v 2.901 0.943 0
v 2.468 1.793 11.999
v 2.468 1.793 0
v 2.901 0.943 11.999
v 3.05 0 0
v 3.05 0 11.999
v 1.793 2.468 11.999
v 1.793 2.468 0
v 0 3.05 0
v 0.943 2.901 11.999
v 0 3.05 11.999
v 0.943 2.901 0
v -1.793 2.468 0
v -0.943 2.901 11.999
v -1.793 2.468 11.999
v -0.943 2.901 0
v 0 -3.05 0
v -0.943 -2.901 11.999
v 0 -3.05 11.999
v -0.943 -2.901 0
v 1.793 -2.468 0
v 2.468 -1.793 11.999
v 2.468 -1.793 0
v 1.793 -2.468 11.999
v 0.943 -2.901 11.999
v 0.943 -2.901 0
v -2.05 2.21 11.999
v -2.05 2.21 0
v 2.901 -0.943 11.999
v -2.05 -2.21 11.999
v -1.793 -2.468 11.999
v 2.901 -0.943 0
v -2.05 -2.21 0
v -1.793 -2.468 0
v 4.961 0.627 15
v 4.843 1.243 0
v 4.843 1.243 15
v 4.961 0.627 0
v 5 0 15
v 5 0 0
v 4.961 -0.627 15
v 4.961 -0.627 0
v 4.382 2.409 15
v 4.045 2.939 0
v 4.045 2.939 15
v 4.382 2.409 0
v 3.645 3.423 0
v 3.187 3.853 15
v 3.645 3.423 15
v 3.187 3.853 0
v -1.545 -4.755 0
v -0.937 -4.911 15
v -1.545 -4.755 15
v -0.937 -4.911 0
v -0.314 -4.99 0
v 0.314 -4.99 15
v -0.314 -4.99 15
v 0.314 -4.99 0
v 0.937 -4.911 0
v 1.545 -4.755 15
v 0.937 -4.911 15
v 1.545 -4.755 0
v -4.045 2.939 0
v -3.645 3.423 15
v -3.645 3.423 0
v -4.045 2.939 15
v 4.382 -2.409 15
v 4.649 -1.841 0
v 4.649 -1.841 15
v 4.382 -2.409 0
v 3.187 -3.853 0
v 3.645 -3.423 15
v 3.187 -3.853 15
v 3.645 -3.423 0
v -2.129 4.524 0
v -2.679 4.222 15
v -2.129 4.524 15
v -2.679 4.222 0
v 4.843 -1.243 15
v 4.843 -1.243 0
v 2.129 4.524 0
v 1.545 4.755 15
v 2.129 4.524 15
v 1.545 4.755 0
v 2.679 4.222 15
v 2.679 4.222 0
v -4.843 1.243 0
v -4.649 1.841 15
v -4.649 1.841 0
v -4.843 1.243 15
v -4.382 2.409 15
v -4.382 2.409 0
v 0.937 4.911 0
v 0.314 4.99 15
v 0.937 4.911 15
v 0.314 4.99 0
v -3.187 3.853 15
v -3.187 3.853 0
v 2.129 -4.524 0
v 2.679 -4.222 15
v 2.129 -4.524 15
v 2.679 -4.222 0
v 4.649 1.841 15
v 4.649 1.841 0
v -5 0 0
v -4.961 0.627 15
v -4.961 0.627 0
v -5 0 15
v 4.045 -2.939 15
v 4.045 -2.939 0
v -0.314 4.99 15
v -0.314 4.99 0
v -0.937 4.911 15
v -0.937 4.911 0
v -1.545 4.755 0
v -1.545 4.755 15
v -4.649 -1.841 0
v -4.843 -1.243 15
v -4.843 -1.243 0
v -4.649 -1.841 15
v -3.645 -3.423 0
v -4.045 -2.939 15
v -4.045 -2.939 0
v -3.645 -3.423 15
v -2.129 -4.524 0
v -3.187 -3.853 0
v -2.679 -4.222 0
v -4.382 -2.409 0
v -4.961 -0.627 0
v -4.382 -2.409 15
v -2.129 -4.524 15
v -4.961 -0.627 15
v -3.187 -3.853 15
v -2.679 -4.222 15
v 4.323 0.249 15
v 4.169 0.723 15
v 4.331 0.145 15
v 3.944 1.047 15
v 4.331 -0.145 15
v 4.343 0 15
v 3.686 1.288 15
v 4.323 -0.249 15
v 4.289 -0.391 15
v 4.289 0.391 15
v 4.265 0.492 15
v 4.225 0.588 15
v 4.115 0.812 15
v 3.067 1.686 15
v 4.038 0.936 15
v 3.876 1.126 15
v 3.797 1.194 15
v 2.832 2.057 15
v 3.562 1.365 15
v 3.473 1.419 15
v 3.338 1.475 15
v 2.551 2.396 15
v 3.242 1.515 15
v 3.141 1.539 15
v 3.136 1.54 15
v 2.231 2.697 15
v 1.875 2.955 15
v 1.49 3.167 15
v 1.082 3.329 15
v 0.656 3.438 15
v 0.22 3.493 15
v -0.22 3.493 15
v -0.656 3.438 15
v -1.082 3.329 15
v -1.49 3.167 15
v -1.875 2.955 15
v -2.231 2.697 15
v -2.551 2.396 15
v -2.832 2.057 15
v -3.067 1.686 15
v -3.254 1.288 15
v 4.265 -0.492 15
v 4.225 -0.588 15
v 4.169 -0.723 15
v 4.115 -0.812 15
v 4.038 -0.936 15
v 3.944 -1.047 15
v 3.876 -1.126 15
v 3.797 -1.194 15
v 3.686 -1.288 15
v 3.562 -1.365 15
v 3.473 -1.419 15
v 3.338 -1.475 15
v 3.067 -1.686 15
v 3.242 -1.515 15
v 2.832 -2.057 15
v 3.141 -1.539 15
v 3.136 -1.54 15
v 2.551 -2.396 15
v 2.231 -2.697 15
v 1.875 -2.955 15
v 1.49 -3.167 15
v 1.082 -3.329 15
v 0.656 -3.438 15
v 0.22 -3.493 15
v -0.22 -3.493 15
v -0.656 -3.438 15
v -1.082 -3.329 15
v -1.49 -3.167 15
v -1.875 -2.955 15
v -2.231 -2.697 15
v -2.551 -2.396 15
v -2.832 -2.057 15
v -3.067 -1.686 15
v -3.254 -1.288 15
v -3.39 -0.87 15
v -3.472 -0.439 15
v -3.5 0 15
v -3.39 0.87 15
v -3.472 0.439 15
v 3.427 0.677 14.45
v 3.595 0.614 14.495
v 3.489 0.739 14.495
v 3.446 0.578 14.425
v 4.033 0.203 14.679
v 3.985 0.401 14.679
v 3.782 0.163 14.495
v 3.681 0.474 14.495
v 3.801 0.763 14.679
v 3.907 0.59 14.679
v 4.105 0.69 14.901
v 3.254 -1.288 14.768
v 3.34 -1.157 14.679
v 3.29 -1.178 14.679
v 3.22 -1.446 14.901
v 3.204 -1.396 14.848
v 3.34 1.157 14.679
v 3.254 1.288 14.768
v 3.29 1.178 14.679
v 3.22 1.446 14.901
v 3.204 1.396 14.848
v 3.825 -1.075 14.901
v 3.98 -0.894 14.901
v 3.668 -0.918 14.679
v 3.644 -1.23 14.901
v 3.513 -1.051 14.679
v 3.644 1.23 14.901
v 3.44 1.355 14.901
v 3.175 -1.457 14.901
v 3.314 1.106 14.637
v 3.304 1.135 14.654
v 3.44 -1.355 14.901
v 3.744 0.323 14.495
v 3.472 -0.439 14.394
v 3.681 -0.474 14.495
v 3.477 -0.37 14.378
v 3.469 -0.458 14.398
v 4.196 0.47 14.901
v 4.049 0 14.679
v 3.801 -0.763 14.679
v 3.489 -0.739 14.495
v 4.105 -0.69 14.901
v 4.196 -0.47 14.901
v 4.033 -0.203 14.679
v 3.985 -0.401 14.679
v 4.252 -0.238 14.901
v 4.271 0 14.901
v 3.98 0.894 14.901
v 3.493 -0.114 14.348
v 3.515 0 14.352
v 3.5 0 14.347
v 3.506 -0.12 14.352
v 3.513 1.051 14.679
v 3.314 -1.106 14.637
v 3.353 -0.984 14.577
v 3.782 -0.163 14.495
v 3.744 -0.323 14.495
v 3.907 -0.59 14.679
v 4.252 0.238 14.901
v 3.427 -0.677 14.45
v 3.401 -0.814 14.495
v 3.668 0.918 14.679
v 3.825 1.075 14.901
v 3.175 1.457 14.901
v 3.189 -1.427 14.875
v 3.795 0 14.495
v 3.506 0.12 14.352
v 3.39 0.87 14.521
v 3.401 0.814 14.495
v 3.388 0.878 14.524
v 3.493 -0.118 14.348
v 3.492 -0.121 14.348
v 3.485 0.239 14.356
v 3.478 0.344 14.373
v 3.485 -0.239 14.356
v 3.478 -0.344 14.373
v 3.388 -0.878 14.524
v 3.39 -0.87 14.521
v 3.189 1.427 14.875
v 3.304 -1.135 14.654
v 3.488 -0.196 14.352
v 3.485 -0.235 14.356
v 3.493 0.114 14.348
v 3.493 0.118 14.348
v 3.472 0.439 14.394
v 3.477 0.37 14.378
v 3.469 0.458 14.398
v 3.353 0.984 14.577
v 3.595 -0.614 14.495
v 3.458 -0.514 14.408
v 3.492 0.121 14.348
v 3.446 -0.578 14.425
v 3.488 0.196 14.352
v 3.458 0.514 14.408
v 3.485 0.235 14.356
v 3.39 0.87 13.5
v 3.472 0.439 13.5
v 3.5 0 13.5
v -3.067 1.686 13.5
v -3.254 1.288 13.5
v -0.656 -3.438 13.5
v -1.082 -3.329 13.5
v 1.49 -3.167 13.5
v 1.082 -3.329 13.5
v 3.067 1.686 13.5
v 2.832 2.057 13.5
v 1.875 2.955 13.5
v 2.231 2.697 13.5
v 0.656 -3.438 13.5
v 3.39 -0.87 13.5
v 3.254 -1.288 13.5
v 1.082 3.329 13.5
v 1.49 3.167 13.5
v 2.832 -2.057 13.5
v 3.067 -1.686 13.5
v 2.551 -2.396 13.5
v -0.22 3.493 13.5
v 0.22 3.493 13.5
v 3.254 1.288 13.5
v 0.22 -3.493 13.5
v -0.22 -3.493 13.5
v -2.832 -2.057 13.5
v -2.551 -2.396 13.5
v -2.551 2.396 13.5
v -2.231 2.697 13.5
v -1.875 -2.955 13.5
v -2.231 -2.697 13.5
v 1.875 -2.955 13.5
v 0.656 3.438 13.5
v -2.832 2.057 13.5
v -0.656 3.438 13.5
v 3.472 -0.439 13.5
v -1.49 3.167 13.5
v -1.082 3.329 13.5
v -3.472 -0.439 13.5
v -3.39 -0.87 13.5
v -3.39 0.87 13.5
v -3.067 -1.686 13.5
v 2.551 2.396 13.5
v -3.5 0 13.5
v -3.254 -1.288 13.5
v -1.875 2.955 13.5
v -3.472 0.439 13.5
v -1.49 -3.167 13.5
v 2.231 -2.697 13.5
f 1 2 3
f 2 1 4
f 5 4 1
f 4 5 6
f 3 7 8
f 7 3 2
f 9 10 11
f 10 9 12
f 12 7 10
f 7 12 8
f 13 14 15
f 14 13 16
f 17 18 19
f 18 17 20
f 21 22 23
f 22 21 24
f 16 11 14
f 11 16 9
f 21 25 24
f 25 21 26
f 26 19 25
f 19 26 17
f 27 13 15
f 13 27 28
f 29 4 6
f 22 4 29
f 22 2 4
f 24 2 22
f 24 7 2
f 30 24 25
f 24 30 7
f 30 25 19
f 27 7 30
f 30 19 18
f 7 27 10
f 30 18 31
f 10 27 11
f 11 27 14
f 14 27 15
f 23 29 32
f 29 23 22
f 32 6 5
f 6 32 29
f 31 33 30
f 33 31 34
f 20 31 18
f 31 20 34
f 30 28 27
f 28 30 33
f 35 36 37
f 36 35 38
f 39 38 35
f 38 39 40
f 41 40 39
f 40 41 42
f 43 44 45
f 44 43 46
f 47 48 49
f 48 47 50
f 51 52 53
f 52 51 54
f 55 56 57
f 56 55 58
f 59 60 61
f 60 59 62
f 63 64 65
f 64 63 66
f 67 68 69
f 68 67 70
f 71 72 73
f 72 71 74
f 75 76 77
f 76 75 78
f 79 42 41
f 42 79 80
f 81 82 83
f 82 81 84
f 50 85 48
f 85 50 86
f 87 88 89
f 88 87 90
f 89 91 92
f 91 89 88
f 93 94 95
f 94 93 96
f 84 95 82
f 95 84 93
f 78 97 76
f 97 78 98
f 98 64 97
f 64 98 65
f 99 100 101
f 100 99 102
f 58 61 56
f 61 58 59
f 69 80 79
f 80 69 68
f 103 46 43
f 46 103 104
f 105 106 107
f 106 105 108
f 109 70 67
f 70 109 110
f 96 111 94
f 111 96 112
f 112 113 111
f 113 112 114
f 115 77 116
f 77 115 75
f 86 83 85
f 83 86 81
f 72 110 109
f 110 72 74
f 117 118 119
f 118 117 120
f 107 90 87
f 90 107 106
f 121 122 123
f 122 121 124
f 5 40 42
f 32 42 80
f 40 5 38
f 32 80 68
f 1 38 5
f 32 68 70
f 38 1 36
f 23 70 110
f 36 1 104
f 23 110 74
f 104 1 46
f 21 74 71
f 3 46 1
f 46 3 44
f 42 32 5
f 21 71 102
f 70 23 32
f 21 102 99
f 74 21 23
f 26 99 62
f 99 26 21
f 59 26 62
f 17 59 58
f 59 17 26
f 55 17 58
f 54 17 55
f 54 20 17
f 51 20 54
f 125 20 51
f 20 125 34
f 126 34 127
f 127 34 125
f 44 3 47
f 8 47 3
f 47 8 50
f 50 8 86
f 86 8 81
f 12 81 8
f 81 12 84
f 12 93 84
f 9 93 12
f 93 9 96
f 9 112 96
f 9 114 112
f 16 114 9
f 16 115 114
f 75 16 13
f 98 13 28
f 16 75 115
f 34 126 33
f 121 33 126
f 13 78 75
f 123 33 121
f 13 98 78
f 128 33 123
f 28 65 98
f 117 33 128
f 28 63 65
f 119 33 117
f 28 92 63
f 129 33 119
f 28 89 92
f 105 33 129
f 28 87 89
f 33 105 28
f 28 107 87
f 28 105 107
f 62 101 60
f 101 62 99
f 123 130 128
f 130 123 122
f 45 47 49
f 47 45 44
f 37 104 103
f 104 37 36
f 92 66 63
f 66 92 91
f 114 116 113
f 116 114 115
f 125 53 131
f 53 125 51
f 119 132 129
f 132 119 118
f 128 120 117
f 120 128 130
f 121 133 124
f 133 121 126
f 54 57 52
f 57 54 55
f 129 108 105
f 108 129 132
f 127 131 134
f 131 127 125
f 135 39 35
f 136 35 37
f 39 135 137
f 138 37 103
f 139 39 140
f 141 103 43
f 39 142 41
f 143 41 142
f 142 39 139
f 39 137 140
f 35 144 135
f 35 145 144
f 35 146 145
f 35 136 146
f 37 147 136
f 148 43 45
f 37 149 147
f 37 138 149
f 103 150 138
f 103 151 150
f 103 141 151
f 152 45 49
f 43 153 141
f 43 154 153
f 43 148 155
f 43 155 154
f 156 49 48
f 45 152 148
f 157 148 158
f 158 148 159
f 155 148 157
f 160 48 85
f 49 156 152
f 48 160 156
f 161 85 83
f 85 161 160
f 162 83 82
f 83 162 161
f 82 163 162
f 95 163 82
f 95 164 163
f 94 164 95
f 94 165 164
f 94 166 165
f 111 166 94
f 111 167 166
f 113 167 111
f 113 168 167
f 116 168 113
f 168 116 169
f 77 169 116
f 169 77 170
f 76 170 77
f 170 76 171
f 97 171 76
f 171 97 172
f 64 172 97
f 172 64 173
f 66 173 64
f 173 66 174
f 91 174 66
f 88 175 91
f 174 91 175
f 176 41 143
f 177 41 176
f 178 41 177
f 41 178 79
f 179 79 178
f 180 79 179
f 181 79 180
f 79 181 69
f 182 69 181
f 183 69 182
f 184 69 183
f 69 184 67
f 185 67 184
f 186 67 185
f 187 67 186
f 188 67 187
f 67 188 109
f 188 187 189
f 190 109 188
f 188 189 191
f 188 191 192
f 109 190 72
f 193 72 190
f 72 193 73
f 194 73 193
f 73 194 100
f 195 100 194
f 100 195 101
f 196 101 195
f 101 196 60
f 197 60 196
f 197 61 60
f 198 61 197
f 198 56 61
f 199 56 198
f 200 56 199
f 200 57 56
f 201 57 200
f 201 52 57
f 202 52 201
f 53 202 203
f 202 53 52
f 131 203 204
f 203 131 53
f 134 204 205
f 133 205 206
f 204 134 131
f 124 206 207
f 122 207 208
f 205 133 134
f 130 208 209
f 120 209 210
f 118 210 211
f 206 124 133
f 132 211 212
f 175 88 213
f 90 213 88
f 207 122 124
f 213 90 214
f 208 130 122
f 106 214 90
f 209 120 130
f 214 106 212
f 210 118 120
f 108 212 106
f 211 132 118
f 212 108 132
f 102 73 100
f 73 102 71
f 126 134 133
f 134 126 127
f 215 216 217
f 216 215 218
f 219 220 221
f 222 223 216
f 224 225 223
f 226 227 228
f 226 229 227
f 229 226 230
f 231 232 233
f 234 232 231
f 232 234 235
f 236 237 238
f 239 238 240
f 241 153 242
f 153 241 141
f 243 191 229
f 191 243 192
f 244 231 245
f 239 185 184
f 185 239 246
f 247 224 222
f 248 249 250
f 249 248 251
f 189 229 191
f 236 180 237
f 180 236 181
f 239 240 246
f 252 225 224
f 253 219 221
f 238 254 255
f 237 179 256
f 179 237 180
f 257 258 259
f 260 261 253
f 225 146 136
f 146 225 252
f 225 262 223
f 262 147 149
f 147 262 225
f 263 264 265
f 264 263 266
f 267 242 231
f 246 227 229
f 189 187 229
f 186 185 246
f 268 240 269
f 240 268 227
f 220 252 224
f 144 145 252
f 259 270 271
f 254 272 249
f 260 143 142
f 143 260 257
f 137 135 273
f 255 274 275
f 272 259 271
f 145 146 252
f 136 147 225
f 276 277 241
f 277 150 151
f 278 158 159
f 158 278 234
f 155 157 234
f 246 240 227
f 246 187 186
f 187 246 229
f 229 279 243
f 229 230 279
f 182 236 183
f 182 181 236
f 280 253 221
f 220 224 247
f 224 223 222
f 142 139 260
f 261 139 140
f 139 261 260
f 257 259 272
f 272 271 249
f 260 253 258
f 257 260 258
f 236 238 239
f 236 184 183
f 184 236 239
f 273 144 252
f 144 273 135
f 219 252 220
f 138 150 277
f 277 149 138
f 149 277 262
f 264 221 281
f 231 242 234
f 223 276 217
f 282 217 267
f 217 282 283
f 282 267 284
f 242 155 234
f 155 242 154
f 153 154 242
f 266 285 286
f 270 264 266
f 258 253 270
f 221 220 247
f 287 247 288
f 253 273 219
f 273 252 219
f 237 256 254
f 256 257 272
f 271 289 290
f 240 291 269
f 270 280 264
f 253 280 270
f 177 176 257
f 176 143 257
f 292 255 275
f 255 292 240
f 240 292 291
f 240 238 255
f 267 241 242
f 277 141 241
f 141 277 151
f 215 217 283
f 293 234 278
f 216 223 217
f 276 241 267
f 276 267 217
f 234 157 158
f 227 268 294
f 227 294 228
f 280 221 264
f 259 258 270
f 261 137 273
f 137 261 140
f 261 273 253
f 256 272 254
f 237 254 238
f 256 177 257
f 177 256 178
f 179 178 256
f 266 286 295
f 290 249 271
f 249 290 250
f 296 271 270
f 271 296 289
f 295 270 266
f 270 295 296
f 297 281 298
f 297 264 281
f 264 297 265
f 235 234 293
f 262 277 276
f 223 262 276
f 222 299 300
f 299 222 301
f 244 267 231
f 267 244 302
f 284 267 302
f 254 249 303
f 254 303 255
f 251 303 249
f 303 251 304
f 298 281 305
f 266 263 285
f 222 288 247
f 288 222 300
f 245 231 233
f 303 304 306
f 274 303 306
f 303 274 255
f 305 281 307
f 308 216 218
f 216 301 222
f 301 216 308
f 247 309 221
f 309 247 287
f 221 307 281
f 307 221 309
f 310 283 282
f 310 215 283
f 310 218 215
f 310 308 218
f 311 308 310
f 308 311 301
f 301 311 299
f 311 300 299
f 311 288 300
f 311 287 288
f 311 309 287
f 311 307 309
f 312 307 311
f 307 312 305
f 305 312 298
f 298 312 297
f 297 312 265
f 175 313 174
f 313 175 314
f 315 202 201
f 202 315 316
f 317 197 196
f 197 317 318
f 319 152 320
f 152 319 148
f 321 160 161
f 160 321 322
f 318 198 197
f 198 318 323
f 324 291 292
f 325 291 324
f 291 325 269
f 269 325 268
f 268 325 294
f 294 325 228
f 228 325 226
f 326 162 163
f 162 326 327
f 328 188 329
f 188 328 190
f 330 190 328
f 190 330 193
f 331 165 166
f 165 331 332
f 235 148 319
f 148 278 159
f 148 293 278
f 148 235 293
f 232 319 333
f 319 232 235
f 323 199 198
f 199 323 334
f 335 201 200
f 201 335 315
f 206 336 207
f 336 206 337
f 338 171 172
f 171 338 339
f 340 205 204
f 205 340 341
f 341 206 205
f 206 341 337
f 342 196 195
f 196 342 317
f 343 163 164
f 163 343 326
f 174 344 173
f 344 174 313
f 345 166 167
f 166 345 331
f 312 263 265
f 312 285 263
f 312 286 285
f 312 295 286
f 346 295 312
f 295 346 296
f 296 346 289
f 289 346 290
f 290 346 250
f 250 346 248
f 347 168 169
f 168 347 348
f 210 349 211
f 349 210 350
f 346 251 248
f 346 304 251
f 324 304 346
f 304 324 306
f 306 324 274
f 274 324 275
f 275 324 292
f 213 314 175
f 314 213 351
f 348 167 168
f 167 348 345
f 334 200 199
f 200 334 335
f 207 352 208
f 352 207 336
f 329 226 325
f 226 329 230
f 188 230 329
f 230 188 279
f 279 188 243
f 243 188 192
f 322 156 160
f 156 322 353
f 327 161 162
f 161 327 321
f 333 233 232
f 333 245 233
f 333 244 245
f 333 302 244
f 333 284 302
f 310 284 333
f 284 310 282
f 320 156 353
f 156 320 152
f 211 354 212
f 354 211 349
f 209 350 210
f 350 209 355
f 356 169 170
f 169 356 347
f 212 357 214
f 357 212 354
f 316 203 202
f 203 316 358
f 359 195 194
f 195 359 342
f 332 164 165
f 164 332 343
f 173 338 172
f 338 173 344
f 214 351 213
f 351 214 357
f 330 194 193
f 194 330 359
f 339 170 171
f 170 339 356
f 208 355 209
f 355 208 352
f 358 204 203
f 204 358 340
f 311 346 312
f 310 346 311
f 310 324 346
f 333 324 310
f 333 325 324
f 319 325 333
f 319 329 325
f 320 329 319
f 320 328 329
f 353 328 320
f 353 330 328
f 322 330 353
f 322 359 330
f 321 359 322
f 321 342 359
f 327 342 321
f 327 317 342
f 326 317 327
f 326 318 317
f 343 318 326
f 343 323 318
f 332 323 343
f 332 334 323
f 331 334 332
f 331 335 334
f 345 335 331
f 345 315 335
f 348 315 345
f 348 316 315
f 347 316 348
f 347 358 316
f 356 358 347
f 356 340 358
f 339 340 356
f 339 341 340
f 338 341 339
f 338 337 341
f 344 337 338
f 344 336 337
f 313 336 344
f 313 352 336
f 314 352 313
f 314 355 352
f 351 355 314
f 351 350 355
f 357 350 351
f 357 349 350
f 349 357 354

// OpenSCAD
//////////////////////////
// Customizable settings
//////////////////////////


// Diameter of the hole on the bottom (in mm).
HoleDiameter = 6.1;

// Depth of the hole in the bottom (in mm).  If you want the hole to go all the way through then set this to a number larger than the total height of the object.
HoleDepth = 12;

// If you want a D-shaped hole, set this to the thickness of the flat side (in mm).  Larger values for the flat make the hole smaller.
HoleFlatThickness = 1;

// Height (in mm).  If dome cap is selected, it is not included in height.  The shaft length is also not counted.
KnobHeight = 15;

// Diameter of base of round part of knob (in mm).  (Knurled ridges are not included in this measurement.)
KnobDiameter = 10;

// Shape of top of knob.  "Recessed" type can be painted.
CapType = 1;	// [0:Flat, 1:Recessed, 2:Dome]

// Do you want a large timer-knob style pointer?
TimerKnob=0;	// [0:No, 1:Yes]

// Would you like a divot on the top to indicate direction?
Pointer1 = 1;	// [0:No, 1:Yes]

// Would you like a line (pointer) on the front to indicate direction?
Pointer2 = 0;	// [0:No, 1:Yes]

// Do you want finger ridges around the knob?
Knurled = 0;	// [0:No, 1:Yes]

// 0 = A cylindrical knob, any other value will taper the knob.
TaperPercentage = 0 ;		// [0:0%, 10:10%, 20:20%, 30:30%, 40:40%, 50:50%]

// Width of "dial" ring (in mm).  Set to zero if you don't want the ring.
RingWidth = 0;

// The number of markings on the dial.  Set to zero if you don't want markings.  (RingWidth must be non-zero.)
RingMarkings = 2;

// diameter of the hole for the setscrew (in mm).  If you don't need a hole, set this to zero.
ScrewHoleDiameter = 0;

// Length of the shaft on the bottom of the knob (in mm).  If you don't want a shaft, set this value to zero.
ShaftLength = 0;

// Diameter of the shaft on the bottom of the knob (in mm).  (ShaftLength must be non-zero.)
ShaftDiameter = 10;

// Would you like a notch in the shaft?  It can be used for a press-on type knob (rather than using a setscrew).  (ShaftLength must be non-zero.)
NotchedShaft = 0;	// [0:No, 1:Yes]



//////////////////////////
//Advanced settings
//////////////////////////

RingThickness = 5*1;
DivotDepth = 1.5*1;
MarkingWidth = 1.5*1;
DistanceBetweenKnurls = 3*3;
TimerKnobConst = 1.8*1;



//////////////////////////
//Calculations
//////////////////////////

PI=3.14159265*1;
KnobMajorRadius = KnobDiameter/2;
KnobMinorRadius = KnobDiameter/2 * (1 - TaperPercentage/100);
KnobRadius = KnobMinorRadius + (KnobMajorRadius-KnobMinorRadius)/2;
KnobCircumference = PI*KnobDiameter;
Knurls = round(KnobCircumference/DistanceBetweenKnurls);
Divot=CapType;

TaperAngle=asin(KnobHeight / (sqrt(pow(KnobHeight, 2) +
		pow(KnobMajorRadius-KnobMinorRadius,2)))) - 90;

DivotRadius = KnobMinorRadius*.4;


union()
{
translate([0, 0, (ShaftLength==0)? 0 : ShaftLength-0.001])
difference()
{
union()
{
	// Primary knob cylinder
	cylinder(h=KnobHeight, r1=KnobMajorRadius, r2=KnobMinorRadius,
			$fn=50);
	
	if (Knurled)
		for (i=[0 : Knurls-1])
			rotate([0, 0, i * (360/Knurls)])
				translate([KnobRadius, 0, KnobHeight/2])
					rotate([0, TaperAngle, 0]) rotate([0, 0, 45])
						cube([2, 2, KnobHeight+.001], center=true);

 	if (RingMarkings>0)
		for (i=[0 : RingMarkings-1])
			rotate([0, 0, i * (360/RingMarkings)])
				translate([KnobMajorRadius + RingWidth/2, 0, 1])
					cube([RingWidth*.5, MarkingWidth, 2], center=true);		
	
	if (Pointer2==1)
		translate([KnobRadius, 0, KnobHeight/2-2])
			rotate([0, TaperAngle, 0])
				cube([8, 3, KnobHeight], center=true);		

	if (RingWidth>0)
		translate([0, 0, RingThickness/2])
			cylinder(r1=KnobMajorRadius + RingWidth, r2=KnobMinorRadius,
					h=RingThickness, $fn=50, center=true);

	if (Divot==2)
		translate([0, 0, KnobHeight])
			difference()
			{
				scale([1, 1, 0.5])
					sphere(r=KnobMinorRadius, $fn=50, center=true);

				translate([0, 0, 0-(KnobMinorRadius+.001)])
					cube([KnobMinorRadius*2.5, KnobMinorRadius*2.5,
							KnobMinorRadius*2], center=true);
			}

	if (TimerKnob==1) intersection()
		{
			translate([0, 0, 0-(KnobDiameter*TimerKnobConst) + KnobHeight])
			sphere(r=KnobDiameter*TimerKnobConst, $fn=50, center=true);		
	
			translate([0-(KnobDiameter*TimerKnobConst)*0.1, 0,
					KnobHeight/2])
				scale([1, 0.5, 1])
					cylinder(h=KnobHeight, r=(KnobDiameter*TimerKnobConst) *
							0.8, $fn=3, center=true);
		}
}

// Pointer1: Offset hemispherical divot
if (Pointer1==1)
	translate([KnobMinorRadius*.55, 0, KnobHeight + DivotRadius*.6])
		sphere(r=DivotRadius, $fn=40);

// Divot1: Centered cylynrical divot
if (Divot==1)
	translate([0, 0, KnobHeight])
		cylinder(h=DivotDepth*2, r=KnobMinorRadius-1.5, $fn=50,
				center=true);

if (ShaftLength==0)
{
	// Hole for shaft
	translate([0, 0, HoleDepth/2 - 0.001])
		difference()
		{
			cylinder(r=HoleDiameter/2, h=HoleDepth, $fn=20,
					center=true);
	
			// Flat for D-shaped hole
			translate([(0-HoleDiameter)+HoleFlatThickness, 0, 0])
				cube([HoleDiameter, HoleDiameter, HoleDepth+.001],
						center=true);
		}
	
	// Hole for setscrew
	if (ScrewHoleDiameter>0)
		translate([0 - (KnobMajorRadius+RingWidth+1)/2, 0,
				HoleDepth/2])
			rotate([0, 90, 0])
			cylinder(h=(KnobMajorRadius+RingWidth+1),
					r=ScrewHoleDiameter/2, $fn=20, center=true);
}

// Make sure bottom ends at z=0
translate([0, 0, -10])
	cube([(KnobMajorRadius+RingWidth) * 3,
			(KnobMajorRadius+RingWidth) * 3, 20], center=true);
}

if (ShaftLength>0)
	difference()
	{
		translate([0, 0, ShaftLength/2])
			cylinder(h=ShaftLength, r=ShaftDiameter/2, $fn=20,
					center=true);

		if (NotchedShaft==1)
		{
			cube([HoleDiameter/2, ShaftDiameter*2, ShaftLength],
					center=true);
		}

		// Hole for shaft
		translate([0, 0, HoleDepth/2 - 0.001])
			difference()
			{
				cylinder(r=HoleDiameter/2, h=HoleDepth, $fn=20,
						center=true);
		
				// Flat for D-shaped hole
				translate([(0-HoleDiameter)+HoleFlatThickness, 0, 0])
					cube([HoleDiameter, HoleDiameter, HoleDepth+.001],
							center=true);
			}
		
		// Hole for setscrew
		if (ScrewHoleDiameter>0)
			translate([0 - (KnobMajorRadius+RingWidth+1)/2, 0,
					HoleDepth/2])
				rotate([0, 90, 0])
				cylinder(h=(KnobMajorRadius+RingWidth+1),
						r=ScrewHoleDiameter/2, $fn=20, center=true);
	}
}
